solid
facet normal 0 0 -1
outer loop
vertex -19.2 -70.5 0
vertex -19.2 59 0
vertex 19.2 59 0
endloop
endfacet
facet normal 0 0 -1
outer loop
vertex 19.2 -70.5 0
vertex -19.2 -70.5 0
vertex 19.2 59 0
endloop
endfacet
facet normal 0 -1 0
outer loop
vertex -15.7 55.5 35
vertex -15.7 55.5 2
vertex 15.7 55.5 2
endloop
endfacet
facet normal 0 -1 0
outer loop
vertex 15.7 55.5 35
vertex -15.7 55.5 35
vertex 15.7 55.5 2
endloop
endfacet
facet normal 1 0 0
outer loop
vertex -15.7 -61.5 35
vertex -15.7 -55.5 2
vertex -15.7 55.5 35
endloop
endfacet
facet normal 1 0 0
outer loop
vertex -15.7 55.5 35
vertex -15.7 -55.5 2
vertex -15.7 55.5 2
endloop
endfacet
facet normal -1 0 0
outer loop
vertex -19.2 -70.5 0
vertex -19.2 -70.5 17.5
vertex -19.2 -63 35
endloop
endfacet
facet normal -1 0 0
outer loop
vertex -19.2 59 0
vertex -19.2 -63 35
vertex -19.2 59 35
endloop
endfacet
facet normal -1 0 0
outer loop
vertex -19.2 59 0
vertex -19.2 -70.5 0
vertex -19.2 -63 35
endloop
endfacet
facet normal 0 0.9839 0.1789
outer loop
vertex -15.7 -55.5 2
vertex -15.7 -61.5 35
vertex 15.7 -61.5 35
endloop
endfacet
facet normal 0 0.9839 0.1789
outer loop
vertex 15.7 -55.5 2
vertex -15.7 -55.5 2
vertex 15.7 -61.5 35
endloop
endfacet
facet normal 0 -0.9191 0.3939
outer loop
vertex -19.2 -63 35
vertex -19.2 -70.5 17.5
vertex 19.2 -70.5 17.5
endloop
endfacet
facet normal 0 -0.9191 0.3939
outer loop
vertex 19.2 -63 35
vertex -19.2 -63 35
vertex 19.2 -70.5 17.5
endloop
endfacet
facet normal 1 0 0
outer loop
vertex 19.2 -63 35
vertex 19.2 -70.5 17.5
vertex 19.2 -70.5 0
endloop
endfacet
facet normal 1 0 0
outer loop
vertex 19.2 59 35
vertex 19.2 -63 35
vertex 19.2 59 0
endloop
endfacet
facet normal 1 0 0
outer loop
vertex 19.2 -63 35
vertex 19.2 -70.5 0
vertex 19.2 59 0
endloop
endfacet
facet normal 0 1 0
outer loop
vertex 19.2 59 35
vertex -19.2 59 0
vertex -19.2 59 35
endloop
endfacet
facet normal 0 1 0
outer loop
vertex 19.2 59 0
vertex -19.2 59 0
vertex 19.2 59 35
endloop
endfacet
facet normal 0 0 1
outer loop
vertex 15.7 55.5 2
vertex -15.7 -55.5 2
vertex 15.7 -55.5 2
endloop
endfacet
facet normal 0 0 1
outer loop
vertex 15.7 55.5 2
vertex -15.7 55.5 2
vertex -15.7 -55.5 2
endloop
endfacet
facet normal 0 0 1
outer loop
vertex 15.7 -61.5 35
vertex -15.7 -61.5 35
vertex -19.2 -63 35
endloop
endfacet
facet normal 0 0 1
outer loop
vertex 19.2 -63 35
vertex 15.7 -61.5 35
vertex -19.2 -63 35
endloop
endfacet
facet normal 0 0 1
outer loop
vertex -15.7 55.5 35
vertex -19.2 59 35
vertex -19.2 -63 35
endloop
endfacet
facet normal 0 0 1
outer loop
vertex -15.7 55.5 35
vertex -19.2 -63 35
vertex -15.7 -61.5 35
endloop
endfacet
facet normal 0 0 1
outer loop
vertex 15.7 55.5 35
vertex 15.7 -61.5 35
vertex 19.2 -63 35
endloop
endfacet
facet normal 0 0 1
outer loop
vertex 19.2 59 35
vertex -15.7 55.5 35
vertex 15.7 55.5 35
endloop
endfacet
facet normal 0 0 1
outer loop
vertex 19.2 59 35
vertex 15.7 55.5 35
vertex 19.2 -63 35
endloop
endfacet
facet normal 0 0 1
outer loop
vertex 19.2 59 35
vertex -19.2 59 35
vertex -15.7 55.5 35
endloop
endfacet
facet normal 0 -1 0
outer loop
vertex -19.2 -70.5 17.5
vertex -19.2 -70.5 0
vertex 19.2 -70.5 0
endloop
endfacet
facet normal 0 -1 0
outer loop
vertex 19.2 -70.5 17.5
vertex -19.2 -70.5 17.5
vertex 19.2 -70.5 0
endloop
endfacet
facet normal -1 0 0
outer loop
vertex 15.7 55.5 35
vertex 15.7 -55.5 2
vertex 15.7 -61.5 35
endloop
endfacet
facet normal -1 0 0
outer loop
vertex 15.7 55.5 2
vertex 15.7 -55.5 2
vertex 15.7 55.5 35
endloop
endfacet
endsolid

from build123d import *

# Parameters (mm, degrees)
F0_W     = 38.4
F0_H     = 129.5
F0_W_2   = 31.4
F0_H_2   = 111
F1_DEPTH = 2
F2_DEPTH = 35
F3_SIZE2 = 17.5
F3_SIZE  = 7.5
F4_SIZE2 = 32.99999
F4_SIZE  = 5.99999


# Not quite as in the source:
# - a fillet or chamfer is up to 0.001 mm smaller than in the source, because OpenCascade refuses the exact size


with BuildPart() as f1:
    # F0 (on Top) → F1 (new body)
    with BuildSketch(Plane.XY):
        with Locations((0, -5.75)):
            Rectangle(F0_W, F0_H)
        Rectangle(F0_W_2, F0_H_2, mode=Mode.SUBTRACT)
        Rectangle(F0_W_2, F0_H_2)
    extrude(amount=F1_DEPTH)

    # F0 (on Top) → F2 (join)
    with BuildSketch(Plane.XY):
        with Locations((0, -5.75)):
            Rectangle(F0_W, F0_H)
        Rectangle(F0_W_2, F0_H_2, mode=Mode.SUBTRACT)
    extrude(amount=F2_DEPTH)

    # F3
    f3_edges = [f1.edges().sort_by_distance(p)[0] for p in [
        (0, -70.5, 35),
    ]]
    f3_side = f1.faces().sort_by_distance((0, -69.149266, 35))[0]
    chamfer(f3_edges, length=F3_SIZE, length2=F3_SIZE2, reference=f3_side)

    # F4 (size 6 and 33 in the source; OpenCascade refuses exactly that, so slightly less here)
    f4_edges = [f1.edges().sort_by_distance(p)[0] for p in [
        (0, -55.5, 35),
    ]]
    f4_side = f1.faces().sort_by_distance((17.920994, -2, 35))[0]
    chamfer(f4_edges, length=F4_SIZE, length2=F4_SIZE2, reference=f4_side)


solid = f1.part
